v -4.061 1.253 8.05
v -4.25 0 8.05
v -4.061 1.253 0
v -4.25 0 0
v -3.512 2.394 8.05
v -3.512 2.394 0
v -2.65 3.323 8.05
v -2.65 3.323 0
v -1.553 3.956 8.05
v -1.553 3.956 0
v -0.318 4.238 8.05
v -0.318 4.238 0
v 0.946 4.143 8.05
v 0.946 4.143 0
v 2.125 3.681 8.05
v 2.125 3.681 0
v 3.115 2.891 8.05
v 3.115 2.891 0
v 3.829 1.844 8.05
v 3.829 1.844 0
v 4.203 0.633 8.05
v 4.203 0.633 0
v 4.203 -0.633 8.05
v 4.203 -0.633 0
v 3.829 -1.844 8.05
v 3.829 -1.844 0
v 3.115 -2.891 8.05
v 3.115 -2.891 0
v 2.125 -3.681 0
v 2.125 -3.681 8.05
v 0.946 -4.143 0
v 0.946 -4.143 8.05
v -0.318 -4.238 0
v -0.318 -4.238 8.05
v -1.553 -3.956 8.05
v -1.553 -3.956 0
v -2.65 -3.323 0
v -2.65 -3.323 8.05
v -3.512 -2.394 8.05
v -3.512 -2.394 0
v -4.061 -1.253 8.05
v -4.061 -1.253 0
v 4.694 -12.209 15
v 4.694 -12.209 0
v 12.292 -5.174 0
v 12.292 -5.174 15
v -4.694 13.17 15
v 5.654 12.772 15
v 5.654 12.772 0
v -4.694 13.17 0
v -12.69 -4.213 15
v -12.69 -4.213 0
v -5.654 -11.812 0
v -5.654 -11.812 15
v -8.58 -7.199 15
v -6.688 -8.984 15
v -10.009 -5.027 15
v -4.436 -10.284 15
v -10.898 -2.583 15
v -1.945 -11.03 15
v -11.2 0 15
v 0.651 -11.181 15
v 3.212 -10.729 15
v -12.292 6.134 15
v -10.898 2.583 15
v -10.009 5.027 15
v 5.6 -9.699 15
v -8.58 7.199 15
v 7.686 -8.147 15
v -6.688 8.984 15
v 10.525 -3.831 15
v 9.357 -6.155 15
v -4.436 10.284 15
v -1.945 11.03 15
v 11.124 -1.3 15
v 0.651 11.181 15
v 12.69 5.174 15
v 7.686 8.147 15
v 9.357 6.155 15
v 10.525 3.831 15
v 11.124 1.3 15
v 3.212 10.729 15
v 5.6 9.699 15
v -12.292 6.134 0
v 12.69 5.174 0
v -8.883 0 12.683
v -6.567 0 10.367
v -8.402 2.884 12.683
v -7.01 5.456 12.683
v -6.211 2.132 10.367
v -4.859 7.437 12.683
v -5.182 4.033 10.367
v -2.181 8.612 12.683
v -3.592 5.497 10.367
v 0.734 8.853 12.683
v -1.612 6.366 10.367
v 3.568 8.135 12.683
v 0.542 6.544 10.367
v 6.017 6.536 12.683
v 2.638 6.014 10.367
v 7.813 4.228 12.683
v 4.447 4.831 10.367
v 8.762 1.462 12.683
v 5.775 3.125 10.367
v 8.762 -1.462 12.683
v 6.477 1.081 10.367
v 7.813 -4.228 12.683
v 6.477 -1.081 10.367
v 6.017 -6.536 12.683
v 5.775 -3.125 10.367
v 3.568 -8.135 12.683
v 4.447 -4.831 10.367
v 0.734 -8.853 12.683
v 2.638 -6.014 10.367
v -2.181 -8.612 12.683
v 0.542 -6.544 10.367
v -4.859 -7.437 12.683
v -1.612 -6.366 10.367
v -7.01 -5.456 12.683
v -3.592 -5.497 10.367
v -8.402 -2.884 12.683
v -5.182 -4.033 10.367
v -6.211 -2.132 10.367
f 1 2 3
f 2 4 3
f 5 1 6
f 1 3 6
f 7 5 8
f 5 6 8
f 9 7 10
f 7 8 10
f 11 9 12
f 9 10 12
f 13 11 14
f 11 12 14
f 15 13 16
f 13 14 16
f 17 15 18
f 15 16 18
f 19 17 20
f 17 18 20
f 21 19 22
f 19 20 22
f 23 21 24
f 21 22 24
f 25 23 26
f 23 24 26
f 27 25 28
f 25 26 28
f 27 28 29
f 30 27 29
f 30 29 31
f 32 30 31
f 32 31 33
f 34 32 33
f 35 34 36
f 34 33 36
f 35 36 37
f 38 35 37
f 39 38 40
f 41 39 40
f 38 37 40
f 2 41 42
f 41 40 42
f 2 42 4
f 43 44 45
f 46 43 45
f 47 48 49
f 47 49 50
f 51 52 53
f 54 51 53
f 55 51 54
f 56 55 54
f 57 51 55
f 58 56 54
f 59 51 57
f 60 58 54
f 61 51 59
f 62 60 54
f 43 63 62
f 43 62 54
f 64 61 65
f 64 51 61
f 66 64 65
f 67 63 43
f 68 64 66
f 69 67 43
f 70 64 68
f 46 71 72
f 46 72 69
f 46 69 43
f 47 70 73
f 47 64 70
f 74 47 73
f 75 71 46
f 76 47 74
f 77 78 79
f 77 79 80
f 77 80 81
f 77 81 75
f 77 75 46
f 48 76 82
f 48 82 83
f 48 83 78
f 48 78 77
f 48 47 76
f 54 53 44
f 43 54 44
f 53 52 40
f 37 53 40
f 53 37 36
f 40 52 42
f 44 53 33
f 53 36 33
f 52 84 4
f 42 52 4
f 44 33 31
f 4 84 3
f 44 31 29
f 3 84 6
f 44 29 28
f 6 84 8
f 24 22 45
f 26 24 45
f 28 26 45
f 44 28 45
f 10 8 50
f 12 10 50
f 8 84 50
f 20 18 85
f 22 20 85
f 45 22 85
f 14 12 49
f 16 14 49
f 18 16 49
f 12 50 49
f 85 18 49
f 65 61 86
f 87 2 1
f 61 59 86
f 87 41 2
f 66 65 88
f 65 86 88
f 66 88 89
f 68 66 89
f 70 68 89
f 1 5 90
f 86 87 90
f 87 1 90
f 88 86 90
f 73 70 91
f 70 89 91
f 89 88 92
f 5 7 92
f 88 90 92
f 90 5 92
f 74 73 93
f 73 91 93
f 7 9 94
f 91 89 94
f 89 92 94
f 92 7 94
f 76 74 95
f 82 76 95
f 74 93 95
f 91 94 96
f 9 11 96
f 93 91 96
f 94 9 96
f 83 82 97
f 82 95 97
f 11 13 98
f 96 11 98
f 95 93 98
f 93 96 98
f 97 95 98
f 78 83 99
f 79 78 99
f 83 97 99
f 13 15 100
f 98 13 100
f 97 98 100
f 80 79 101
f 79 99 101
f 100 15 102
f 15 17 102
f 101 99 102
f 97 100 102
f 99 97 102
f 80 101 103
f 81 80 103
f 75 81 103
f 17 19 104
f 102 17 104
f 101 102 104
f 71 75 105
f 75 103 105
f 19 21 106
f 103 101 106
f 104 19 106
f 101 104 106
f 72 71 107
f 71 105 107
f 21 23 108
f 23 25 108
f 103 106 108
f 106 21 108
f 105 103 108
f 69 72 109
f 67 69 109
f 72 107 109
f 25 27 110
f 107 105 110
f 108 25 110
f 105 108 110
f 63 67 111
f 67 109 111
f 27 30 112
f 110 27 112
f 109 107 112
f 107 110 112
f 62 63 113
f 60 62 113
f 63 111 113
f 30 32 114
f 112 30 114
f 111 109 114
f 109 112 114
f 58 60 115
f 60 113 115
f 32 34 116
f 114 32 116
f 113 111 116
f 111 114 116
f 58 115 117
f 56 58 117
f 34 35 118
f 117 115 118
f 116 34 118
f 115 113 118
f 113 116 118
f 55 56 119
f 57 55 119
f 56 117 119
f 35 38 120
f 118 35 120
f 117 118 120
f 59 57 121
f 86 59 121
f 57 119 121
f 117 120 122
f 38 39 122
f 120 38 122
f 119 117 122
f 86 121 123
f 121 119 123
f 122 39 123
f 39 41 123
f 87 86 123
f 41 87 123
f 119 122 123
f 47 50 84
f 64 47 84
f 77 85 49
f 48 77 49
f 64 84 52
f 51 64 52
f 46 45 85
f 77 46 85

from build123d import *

# Parameters (mm, degrees)
F1_DEPTH       = 15
F3_D           = 8.5
F3_CSINK_D     = 22.4
F3_CSINK_ANGLE = 90


with BuildPart() as f1:
    # F0 (on Top) → F1 (new body)
    with BuildSketch(Plane.XY):
        Polygon((12.2918519161, -5.1738469947), (12.6896912522, 5.1738469947), (5.654081555, 12.7720864765), (-4.6936124343, 13.1699258125), (-12.2918519161, 6.1343161154), (-12.6896912522, -4.2133778739), (-5.654081555, -11.8116173557), (4.6936124343, -12.2094566918), align=None)
    extrude(amount=F1_DEPTH)

    # F3 (through all)
    with Locations(Plane.XY.offset(15)):
        with Locations((0, 0)):
            CounterSinkHole(F3_D / 2, F3_CSINK_D / 2, counter_sink_angle=F3_CSINK_ANGLE)


solid = f1.part
